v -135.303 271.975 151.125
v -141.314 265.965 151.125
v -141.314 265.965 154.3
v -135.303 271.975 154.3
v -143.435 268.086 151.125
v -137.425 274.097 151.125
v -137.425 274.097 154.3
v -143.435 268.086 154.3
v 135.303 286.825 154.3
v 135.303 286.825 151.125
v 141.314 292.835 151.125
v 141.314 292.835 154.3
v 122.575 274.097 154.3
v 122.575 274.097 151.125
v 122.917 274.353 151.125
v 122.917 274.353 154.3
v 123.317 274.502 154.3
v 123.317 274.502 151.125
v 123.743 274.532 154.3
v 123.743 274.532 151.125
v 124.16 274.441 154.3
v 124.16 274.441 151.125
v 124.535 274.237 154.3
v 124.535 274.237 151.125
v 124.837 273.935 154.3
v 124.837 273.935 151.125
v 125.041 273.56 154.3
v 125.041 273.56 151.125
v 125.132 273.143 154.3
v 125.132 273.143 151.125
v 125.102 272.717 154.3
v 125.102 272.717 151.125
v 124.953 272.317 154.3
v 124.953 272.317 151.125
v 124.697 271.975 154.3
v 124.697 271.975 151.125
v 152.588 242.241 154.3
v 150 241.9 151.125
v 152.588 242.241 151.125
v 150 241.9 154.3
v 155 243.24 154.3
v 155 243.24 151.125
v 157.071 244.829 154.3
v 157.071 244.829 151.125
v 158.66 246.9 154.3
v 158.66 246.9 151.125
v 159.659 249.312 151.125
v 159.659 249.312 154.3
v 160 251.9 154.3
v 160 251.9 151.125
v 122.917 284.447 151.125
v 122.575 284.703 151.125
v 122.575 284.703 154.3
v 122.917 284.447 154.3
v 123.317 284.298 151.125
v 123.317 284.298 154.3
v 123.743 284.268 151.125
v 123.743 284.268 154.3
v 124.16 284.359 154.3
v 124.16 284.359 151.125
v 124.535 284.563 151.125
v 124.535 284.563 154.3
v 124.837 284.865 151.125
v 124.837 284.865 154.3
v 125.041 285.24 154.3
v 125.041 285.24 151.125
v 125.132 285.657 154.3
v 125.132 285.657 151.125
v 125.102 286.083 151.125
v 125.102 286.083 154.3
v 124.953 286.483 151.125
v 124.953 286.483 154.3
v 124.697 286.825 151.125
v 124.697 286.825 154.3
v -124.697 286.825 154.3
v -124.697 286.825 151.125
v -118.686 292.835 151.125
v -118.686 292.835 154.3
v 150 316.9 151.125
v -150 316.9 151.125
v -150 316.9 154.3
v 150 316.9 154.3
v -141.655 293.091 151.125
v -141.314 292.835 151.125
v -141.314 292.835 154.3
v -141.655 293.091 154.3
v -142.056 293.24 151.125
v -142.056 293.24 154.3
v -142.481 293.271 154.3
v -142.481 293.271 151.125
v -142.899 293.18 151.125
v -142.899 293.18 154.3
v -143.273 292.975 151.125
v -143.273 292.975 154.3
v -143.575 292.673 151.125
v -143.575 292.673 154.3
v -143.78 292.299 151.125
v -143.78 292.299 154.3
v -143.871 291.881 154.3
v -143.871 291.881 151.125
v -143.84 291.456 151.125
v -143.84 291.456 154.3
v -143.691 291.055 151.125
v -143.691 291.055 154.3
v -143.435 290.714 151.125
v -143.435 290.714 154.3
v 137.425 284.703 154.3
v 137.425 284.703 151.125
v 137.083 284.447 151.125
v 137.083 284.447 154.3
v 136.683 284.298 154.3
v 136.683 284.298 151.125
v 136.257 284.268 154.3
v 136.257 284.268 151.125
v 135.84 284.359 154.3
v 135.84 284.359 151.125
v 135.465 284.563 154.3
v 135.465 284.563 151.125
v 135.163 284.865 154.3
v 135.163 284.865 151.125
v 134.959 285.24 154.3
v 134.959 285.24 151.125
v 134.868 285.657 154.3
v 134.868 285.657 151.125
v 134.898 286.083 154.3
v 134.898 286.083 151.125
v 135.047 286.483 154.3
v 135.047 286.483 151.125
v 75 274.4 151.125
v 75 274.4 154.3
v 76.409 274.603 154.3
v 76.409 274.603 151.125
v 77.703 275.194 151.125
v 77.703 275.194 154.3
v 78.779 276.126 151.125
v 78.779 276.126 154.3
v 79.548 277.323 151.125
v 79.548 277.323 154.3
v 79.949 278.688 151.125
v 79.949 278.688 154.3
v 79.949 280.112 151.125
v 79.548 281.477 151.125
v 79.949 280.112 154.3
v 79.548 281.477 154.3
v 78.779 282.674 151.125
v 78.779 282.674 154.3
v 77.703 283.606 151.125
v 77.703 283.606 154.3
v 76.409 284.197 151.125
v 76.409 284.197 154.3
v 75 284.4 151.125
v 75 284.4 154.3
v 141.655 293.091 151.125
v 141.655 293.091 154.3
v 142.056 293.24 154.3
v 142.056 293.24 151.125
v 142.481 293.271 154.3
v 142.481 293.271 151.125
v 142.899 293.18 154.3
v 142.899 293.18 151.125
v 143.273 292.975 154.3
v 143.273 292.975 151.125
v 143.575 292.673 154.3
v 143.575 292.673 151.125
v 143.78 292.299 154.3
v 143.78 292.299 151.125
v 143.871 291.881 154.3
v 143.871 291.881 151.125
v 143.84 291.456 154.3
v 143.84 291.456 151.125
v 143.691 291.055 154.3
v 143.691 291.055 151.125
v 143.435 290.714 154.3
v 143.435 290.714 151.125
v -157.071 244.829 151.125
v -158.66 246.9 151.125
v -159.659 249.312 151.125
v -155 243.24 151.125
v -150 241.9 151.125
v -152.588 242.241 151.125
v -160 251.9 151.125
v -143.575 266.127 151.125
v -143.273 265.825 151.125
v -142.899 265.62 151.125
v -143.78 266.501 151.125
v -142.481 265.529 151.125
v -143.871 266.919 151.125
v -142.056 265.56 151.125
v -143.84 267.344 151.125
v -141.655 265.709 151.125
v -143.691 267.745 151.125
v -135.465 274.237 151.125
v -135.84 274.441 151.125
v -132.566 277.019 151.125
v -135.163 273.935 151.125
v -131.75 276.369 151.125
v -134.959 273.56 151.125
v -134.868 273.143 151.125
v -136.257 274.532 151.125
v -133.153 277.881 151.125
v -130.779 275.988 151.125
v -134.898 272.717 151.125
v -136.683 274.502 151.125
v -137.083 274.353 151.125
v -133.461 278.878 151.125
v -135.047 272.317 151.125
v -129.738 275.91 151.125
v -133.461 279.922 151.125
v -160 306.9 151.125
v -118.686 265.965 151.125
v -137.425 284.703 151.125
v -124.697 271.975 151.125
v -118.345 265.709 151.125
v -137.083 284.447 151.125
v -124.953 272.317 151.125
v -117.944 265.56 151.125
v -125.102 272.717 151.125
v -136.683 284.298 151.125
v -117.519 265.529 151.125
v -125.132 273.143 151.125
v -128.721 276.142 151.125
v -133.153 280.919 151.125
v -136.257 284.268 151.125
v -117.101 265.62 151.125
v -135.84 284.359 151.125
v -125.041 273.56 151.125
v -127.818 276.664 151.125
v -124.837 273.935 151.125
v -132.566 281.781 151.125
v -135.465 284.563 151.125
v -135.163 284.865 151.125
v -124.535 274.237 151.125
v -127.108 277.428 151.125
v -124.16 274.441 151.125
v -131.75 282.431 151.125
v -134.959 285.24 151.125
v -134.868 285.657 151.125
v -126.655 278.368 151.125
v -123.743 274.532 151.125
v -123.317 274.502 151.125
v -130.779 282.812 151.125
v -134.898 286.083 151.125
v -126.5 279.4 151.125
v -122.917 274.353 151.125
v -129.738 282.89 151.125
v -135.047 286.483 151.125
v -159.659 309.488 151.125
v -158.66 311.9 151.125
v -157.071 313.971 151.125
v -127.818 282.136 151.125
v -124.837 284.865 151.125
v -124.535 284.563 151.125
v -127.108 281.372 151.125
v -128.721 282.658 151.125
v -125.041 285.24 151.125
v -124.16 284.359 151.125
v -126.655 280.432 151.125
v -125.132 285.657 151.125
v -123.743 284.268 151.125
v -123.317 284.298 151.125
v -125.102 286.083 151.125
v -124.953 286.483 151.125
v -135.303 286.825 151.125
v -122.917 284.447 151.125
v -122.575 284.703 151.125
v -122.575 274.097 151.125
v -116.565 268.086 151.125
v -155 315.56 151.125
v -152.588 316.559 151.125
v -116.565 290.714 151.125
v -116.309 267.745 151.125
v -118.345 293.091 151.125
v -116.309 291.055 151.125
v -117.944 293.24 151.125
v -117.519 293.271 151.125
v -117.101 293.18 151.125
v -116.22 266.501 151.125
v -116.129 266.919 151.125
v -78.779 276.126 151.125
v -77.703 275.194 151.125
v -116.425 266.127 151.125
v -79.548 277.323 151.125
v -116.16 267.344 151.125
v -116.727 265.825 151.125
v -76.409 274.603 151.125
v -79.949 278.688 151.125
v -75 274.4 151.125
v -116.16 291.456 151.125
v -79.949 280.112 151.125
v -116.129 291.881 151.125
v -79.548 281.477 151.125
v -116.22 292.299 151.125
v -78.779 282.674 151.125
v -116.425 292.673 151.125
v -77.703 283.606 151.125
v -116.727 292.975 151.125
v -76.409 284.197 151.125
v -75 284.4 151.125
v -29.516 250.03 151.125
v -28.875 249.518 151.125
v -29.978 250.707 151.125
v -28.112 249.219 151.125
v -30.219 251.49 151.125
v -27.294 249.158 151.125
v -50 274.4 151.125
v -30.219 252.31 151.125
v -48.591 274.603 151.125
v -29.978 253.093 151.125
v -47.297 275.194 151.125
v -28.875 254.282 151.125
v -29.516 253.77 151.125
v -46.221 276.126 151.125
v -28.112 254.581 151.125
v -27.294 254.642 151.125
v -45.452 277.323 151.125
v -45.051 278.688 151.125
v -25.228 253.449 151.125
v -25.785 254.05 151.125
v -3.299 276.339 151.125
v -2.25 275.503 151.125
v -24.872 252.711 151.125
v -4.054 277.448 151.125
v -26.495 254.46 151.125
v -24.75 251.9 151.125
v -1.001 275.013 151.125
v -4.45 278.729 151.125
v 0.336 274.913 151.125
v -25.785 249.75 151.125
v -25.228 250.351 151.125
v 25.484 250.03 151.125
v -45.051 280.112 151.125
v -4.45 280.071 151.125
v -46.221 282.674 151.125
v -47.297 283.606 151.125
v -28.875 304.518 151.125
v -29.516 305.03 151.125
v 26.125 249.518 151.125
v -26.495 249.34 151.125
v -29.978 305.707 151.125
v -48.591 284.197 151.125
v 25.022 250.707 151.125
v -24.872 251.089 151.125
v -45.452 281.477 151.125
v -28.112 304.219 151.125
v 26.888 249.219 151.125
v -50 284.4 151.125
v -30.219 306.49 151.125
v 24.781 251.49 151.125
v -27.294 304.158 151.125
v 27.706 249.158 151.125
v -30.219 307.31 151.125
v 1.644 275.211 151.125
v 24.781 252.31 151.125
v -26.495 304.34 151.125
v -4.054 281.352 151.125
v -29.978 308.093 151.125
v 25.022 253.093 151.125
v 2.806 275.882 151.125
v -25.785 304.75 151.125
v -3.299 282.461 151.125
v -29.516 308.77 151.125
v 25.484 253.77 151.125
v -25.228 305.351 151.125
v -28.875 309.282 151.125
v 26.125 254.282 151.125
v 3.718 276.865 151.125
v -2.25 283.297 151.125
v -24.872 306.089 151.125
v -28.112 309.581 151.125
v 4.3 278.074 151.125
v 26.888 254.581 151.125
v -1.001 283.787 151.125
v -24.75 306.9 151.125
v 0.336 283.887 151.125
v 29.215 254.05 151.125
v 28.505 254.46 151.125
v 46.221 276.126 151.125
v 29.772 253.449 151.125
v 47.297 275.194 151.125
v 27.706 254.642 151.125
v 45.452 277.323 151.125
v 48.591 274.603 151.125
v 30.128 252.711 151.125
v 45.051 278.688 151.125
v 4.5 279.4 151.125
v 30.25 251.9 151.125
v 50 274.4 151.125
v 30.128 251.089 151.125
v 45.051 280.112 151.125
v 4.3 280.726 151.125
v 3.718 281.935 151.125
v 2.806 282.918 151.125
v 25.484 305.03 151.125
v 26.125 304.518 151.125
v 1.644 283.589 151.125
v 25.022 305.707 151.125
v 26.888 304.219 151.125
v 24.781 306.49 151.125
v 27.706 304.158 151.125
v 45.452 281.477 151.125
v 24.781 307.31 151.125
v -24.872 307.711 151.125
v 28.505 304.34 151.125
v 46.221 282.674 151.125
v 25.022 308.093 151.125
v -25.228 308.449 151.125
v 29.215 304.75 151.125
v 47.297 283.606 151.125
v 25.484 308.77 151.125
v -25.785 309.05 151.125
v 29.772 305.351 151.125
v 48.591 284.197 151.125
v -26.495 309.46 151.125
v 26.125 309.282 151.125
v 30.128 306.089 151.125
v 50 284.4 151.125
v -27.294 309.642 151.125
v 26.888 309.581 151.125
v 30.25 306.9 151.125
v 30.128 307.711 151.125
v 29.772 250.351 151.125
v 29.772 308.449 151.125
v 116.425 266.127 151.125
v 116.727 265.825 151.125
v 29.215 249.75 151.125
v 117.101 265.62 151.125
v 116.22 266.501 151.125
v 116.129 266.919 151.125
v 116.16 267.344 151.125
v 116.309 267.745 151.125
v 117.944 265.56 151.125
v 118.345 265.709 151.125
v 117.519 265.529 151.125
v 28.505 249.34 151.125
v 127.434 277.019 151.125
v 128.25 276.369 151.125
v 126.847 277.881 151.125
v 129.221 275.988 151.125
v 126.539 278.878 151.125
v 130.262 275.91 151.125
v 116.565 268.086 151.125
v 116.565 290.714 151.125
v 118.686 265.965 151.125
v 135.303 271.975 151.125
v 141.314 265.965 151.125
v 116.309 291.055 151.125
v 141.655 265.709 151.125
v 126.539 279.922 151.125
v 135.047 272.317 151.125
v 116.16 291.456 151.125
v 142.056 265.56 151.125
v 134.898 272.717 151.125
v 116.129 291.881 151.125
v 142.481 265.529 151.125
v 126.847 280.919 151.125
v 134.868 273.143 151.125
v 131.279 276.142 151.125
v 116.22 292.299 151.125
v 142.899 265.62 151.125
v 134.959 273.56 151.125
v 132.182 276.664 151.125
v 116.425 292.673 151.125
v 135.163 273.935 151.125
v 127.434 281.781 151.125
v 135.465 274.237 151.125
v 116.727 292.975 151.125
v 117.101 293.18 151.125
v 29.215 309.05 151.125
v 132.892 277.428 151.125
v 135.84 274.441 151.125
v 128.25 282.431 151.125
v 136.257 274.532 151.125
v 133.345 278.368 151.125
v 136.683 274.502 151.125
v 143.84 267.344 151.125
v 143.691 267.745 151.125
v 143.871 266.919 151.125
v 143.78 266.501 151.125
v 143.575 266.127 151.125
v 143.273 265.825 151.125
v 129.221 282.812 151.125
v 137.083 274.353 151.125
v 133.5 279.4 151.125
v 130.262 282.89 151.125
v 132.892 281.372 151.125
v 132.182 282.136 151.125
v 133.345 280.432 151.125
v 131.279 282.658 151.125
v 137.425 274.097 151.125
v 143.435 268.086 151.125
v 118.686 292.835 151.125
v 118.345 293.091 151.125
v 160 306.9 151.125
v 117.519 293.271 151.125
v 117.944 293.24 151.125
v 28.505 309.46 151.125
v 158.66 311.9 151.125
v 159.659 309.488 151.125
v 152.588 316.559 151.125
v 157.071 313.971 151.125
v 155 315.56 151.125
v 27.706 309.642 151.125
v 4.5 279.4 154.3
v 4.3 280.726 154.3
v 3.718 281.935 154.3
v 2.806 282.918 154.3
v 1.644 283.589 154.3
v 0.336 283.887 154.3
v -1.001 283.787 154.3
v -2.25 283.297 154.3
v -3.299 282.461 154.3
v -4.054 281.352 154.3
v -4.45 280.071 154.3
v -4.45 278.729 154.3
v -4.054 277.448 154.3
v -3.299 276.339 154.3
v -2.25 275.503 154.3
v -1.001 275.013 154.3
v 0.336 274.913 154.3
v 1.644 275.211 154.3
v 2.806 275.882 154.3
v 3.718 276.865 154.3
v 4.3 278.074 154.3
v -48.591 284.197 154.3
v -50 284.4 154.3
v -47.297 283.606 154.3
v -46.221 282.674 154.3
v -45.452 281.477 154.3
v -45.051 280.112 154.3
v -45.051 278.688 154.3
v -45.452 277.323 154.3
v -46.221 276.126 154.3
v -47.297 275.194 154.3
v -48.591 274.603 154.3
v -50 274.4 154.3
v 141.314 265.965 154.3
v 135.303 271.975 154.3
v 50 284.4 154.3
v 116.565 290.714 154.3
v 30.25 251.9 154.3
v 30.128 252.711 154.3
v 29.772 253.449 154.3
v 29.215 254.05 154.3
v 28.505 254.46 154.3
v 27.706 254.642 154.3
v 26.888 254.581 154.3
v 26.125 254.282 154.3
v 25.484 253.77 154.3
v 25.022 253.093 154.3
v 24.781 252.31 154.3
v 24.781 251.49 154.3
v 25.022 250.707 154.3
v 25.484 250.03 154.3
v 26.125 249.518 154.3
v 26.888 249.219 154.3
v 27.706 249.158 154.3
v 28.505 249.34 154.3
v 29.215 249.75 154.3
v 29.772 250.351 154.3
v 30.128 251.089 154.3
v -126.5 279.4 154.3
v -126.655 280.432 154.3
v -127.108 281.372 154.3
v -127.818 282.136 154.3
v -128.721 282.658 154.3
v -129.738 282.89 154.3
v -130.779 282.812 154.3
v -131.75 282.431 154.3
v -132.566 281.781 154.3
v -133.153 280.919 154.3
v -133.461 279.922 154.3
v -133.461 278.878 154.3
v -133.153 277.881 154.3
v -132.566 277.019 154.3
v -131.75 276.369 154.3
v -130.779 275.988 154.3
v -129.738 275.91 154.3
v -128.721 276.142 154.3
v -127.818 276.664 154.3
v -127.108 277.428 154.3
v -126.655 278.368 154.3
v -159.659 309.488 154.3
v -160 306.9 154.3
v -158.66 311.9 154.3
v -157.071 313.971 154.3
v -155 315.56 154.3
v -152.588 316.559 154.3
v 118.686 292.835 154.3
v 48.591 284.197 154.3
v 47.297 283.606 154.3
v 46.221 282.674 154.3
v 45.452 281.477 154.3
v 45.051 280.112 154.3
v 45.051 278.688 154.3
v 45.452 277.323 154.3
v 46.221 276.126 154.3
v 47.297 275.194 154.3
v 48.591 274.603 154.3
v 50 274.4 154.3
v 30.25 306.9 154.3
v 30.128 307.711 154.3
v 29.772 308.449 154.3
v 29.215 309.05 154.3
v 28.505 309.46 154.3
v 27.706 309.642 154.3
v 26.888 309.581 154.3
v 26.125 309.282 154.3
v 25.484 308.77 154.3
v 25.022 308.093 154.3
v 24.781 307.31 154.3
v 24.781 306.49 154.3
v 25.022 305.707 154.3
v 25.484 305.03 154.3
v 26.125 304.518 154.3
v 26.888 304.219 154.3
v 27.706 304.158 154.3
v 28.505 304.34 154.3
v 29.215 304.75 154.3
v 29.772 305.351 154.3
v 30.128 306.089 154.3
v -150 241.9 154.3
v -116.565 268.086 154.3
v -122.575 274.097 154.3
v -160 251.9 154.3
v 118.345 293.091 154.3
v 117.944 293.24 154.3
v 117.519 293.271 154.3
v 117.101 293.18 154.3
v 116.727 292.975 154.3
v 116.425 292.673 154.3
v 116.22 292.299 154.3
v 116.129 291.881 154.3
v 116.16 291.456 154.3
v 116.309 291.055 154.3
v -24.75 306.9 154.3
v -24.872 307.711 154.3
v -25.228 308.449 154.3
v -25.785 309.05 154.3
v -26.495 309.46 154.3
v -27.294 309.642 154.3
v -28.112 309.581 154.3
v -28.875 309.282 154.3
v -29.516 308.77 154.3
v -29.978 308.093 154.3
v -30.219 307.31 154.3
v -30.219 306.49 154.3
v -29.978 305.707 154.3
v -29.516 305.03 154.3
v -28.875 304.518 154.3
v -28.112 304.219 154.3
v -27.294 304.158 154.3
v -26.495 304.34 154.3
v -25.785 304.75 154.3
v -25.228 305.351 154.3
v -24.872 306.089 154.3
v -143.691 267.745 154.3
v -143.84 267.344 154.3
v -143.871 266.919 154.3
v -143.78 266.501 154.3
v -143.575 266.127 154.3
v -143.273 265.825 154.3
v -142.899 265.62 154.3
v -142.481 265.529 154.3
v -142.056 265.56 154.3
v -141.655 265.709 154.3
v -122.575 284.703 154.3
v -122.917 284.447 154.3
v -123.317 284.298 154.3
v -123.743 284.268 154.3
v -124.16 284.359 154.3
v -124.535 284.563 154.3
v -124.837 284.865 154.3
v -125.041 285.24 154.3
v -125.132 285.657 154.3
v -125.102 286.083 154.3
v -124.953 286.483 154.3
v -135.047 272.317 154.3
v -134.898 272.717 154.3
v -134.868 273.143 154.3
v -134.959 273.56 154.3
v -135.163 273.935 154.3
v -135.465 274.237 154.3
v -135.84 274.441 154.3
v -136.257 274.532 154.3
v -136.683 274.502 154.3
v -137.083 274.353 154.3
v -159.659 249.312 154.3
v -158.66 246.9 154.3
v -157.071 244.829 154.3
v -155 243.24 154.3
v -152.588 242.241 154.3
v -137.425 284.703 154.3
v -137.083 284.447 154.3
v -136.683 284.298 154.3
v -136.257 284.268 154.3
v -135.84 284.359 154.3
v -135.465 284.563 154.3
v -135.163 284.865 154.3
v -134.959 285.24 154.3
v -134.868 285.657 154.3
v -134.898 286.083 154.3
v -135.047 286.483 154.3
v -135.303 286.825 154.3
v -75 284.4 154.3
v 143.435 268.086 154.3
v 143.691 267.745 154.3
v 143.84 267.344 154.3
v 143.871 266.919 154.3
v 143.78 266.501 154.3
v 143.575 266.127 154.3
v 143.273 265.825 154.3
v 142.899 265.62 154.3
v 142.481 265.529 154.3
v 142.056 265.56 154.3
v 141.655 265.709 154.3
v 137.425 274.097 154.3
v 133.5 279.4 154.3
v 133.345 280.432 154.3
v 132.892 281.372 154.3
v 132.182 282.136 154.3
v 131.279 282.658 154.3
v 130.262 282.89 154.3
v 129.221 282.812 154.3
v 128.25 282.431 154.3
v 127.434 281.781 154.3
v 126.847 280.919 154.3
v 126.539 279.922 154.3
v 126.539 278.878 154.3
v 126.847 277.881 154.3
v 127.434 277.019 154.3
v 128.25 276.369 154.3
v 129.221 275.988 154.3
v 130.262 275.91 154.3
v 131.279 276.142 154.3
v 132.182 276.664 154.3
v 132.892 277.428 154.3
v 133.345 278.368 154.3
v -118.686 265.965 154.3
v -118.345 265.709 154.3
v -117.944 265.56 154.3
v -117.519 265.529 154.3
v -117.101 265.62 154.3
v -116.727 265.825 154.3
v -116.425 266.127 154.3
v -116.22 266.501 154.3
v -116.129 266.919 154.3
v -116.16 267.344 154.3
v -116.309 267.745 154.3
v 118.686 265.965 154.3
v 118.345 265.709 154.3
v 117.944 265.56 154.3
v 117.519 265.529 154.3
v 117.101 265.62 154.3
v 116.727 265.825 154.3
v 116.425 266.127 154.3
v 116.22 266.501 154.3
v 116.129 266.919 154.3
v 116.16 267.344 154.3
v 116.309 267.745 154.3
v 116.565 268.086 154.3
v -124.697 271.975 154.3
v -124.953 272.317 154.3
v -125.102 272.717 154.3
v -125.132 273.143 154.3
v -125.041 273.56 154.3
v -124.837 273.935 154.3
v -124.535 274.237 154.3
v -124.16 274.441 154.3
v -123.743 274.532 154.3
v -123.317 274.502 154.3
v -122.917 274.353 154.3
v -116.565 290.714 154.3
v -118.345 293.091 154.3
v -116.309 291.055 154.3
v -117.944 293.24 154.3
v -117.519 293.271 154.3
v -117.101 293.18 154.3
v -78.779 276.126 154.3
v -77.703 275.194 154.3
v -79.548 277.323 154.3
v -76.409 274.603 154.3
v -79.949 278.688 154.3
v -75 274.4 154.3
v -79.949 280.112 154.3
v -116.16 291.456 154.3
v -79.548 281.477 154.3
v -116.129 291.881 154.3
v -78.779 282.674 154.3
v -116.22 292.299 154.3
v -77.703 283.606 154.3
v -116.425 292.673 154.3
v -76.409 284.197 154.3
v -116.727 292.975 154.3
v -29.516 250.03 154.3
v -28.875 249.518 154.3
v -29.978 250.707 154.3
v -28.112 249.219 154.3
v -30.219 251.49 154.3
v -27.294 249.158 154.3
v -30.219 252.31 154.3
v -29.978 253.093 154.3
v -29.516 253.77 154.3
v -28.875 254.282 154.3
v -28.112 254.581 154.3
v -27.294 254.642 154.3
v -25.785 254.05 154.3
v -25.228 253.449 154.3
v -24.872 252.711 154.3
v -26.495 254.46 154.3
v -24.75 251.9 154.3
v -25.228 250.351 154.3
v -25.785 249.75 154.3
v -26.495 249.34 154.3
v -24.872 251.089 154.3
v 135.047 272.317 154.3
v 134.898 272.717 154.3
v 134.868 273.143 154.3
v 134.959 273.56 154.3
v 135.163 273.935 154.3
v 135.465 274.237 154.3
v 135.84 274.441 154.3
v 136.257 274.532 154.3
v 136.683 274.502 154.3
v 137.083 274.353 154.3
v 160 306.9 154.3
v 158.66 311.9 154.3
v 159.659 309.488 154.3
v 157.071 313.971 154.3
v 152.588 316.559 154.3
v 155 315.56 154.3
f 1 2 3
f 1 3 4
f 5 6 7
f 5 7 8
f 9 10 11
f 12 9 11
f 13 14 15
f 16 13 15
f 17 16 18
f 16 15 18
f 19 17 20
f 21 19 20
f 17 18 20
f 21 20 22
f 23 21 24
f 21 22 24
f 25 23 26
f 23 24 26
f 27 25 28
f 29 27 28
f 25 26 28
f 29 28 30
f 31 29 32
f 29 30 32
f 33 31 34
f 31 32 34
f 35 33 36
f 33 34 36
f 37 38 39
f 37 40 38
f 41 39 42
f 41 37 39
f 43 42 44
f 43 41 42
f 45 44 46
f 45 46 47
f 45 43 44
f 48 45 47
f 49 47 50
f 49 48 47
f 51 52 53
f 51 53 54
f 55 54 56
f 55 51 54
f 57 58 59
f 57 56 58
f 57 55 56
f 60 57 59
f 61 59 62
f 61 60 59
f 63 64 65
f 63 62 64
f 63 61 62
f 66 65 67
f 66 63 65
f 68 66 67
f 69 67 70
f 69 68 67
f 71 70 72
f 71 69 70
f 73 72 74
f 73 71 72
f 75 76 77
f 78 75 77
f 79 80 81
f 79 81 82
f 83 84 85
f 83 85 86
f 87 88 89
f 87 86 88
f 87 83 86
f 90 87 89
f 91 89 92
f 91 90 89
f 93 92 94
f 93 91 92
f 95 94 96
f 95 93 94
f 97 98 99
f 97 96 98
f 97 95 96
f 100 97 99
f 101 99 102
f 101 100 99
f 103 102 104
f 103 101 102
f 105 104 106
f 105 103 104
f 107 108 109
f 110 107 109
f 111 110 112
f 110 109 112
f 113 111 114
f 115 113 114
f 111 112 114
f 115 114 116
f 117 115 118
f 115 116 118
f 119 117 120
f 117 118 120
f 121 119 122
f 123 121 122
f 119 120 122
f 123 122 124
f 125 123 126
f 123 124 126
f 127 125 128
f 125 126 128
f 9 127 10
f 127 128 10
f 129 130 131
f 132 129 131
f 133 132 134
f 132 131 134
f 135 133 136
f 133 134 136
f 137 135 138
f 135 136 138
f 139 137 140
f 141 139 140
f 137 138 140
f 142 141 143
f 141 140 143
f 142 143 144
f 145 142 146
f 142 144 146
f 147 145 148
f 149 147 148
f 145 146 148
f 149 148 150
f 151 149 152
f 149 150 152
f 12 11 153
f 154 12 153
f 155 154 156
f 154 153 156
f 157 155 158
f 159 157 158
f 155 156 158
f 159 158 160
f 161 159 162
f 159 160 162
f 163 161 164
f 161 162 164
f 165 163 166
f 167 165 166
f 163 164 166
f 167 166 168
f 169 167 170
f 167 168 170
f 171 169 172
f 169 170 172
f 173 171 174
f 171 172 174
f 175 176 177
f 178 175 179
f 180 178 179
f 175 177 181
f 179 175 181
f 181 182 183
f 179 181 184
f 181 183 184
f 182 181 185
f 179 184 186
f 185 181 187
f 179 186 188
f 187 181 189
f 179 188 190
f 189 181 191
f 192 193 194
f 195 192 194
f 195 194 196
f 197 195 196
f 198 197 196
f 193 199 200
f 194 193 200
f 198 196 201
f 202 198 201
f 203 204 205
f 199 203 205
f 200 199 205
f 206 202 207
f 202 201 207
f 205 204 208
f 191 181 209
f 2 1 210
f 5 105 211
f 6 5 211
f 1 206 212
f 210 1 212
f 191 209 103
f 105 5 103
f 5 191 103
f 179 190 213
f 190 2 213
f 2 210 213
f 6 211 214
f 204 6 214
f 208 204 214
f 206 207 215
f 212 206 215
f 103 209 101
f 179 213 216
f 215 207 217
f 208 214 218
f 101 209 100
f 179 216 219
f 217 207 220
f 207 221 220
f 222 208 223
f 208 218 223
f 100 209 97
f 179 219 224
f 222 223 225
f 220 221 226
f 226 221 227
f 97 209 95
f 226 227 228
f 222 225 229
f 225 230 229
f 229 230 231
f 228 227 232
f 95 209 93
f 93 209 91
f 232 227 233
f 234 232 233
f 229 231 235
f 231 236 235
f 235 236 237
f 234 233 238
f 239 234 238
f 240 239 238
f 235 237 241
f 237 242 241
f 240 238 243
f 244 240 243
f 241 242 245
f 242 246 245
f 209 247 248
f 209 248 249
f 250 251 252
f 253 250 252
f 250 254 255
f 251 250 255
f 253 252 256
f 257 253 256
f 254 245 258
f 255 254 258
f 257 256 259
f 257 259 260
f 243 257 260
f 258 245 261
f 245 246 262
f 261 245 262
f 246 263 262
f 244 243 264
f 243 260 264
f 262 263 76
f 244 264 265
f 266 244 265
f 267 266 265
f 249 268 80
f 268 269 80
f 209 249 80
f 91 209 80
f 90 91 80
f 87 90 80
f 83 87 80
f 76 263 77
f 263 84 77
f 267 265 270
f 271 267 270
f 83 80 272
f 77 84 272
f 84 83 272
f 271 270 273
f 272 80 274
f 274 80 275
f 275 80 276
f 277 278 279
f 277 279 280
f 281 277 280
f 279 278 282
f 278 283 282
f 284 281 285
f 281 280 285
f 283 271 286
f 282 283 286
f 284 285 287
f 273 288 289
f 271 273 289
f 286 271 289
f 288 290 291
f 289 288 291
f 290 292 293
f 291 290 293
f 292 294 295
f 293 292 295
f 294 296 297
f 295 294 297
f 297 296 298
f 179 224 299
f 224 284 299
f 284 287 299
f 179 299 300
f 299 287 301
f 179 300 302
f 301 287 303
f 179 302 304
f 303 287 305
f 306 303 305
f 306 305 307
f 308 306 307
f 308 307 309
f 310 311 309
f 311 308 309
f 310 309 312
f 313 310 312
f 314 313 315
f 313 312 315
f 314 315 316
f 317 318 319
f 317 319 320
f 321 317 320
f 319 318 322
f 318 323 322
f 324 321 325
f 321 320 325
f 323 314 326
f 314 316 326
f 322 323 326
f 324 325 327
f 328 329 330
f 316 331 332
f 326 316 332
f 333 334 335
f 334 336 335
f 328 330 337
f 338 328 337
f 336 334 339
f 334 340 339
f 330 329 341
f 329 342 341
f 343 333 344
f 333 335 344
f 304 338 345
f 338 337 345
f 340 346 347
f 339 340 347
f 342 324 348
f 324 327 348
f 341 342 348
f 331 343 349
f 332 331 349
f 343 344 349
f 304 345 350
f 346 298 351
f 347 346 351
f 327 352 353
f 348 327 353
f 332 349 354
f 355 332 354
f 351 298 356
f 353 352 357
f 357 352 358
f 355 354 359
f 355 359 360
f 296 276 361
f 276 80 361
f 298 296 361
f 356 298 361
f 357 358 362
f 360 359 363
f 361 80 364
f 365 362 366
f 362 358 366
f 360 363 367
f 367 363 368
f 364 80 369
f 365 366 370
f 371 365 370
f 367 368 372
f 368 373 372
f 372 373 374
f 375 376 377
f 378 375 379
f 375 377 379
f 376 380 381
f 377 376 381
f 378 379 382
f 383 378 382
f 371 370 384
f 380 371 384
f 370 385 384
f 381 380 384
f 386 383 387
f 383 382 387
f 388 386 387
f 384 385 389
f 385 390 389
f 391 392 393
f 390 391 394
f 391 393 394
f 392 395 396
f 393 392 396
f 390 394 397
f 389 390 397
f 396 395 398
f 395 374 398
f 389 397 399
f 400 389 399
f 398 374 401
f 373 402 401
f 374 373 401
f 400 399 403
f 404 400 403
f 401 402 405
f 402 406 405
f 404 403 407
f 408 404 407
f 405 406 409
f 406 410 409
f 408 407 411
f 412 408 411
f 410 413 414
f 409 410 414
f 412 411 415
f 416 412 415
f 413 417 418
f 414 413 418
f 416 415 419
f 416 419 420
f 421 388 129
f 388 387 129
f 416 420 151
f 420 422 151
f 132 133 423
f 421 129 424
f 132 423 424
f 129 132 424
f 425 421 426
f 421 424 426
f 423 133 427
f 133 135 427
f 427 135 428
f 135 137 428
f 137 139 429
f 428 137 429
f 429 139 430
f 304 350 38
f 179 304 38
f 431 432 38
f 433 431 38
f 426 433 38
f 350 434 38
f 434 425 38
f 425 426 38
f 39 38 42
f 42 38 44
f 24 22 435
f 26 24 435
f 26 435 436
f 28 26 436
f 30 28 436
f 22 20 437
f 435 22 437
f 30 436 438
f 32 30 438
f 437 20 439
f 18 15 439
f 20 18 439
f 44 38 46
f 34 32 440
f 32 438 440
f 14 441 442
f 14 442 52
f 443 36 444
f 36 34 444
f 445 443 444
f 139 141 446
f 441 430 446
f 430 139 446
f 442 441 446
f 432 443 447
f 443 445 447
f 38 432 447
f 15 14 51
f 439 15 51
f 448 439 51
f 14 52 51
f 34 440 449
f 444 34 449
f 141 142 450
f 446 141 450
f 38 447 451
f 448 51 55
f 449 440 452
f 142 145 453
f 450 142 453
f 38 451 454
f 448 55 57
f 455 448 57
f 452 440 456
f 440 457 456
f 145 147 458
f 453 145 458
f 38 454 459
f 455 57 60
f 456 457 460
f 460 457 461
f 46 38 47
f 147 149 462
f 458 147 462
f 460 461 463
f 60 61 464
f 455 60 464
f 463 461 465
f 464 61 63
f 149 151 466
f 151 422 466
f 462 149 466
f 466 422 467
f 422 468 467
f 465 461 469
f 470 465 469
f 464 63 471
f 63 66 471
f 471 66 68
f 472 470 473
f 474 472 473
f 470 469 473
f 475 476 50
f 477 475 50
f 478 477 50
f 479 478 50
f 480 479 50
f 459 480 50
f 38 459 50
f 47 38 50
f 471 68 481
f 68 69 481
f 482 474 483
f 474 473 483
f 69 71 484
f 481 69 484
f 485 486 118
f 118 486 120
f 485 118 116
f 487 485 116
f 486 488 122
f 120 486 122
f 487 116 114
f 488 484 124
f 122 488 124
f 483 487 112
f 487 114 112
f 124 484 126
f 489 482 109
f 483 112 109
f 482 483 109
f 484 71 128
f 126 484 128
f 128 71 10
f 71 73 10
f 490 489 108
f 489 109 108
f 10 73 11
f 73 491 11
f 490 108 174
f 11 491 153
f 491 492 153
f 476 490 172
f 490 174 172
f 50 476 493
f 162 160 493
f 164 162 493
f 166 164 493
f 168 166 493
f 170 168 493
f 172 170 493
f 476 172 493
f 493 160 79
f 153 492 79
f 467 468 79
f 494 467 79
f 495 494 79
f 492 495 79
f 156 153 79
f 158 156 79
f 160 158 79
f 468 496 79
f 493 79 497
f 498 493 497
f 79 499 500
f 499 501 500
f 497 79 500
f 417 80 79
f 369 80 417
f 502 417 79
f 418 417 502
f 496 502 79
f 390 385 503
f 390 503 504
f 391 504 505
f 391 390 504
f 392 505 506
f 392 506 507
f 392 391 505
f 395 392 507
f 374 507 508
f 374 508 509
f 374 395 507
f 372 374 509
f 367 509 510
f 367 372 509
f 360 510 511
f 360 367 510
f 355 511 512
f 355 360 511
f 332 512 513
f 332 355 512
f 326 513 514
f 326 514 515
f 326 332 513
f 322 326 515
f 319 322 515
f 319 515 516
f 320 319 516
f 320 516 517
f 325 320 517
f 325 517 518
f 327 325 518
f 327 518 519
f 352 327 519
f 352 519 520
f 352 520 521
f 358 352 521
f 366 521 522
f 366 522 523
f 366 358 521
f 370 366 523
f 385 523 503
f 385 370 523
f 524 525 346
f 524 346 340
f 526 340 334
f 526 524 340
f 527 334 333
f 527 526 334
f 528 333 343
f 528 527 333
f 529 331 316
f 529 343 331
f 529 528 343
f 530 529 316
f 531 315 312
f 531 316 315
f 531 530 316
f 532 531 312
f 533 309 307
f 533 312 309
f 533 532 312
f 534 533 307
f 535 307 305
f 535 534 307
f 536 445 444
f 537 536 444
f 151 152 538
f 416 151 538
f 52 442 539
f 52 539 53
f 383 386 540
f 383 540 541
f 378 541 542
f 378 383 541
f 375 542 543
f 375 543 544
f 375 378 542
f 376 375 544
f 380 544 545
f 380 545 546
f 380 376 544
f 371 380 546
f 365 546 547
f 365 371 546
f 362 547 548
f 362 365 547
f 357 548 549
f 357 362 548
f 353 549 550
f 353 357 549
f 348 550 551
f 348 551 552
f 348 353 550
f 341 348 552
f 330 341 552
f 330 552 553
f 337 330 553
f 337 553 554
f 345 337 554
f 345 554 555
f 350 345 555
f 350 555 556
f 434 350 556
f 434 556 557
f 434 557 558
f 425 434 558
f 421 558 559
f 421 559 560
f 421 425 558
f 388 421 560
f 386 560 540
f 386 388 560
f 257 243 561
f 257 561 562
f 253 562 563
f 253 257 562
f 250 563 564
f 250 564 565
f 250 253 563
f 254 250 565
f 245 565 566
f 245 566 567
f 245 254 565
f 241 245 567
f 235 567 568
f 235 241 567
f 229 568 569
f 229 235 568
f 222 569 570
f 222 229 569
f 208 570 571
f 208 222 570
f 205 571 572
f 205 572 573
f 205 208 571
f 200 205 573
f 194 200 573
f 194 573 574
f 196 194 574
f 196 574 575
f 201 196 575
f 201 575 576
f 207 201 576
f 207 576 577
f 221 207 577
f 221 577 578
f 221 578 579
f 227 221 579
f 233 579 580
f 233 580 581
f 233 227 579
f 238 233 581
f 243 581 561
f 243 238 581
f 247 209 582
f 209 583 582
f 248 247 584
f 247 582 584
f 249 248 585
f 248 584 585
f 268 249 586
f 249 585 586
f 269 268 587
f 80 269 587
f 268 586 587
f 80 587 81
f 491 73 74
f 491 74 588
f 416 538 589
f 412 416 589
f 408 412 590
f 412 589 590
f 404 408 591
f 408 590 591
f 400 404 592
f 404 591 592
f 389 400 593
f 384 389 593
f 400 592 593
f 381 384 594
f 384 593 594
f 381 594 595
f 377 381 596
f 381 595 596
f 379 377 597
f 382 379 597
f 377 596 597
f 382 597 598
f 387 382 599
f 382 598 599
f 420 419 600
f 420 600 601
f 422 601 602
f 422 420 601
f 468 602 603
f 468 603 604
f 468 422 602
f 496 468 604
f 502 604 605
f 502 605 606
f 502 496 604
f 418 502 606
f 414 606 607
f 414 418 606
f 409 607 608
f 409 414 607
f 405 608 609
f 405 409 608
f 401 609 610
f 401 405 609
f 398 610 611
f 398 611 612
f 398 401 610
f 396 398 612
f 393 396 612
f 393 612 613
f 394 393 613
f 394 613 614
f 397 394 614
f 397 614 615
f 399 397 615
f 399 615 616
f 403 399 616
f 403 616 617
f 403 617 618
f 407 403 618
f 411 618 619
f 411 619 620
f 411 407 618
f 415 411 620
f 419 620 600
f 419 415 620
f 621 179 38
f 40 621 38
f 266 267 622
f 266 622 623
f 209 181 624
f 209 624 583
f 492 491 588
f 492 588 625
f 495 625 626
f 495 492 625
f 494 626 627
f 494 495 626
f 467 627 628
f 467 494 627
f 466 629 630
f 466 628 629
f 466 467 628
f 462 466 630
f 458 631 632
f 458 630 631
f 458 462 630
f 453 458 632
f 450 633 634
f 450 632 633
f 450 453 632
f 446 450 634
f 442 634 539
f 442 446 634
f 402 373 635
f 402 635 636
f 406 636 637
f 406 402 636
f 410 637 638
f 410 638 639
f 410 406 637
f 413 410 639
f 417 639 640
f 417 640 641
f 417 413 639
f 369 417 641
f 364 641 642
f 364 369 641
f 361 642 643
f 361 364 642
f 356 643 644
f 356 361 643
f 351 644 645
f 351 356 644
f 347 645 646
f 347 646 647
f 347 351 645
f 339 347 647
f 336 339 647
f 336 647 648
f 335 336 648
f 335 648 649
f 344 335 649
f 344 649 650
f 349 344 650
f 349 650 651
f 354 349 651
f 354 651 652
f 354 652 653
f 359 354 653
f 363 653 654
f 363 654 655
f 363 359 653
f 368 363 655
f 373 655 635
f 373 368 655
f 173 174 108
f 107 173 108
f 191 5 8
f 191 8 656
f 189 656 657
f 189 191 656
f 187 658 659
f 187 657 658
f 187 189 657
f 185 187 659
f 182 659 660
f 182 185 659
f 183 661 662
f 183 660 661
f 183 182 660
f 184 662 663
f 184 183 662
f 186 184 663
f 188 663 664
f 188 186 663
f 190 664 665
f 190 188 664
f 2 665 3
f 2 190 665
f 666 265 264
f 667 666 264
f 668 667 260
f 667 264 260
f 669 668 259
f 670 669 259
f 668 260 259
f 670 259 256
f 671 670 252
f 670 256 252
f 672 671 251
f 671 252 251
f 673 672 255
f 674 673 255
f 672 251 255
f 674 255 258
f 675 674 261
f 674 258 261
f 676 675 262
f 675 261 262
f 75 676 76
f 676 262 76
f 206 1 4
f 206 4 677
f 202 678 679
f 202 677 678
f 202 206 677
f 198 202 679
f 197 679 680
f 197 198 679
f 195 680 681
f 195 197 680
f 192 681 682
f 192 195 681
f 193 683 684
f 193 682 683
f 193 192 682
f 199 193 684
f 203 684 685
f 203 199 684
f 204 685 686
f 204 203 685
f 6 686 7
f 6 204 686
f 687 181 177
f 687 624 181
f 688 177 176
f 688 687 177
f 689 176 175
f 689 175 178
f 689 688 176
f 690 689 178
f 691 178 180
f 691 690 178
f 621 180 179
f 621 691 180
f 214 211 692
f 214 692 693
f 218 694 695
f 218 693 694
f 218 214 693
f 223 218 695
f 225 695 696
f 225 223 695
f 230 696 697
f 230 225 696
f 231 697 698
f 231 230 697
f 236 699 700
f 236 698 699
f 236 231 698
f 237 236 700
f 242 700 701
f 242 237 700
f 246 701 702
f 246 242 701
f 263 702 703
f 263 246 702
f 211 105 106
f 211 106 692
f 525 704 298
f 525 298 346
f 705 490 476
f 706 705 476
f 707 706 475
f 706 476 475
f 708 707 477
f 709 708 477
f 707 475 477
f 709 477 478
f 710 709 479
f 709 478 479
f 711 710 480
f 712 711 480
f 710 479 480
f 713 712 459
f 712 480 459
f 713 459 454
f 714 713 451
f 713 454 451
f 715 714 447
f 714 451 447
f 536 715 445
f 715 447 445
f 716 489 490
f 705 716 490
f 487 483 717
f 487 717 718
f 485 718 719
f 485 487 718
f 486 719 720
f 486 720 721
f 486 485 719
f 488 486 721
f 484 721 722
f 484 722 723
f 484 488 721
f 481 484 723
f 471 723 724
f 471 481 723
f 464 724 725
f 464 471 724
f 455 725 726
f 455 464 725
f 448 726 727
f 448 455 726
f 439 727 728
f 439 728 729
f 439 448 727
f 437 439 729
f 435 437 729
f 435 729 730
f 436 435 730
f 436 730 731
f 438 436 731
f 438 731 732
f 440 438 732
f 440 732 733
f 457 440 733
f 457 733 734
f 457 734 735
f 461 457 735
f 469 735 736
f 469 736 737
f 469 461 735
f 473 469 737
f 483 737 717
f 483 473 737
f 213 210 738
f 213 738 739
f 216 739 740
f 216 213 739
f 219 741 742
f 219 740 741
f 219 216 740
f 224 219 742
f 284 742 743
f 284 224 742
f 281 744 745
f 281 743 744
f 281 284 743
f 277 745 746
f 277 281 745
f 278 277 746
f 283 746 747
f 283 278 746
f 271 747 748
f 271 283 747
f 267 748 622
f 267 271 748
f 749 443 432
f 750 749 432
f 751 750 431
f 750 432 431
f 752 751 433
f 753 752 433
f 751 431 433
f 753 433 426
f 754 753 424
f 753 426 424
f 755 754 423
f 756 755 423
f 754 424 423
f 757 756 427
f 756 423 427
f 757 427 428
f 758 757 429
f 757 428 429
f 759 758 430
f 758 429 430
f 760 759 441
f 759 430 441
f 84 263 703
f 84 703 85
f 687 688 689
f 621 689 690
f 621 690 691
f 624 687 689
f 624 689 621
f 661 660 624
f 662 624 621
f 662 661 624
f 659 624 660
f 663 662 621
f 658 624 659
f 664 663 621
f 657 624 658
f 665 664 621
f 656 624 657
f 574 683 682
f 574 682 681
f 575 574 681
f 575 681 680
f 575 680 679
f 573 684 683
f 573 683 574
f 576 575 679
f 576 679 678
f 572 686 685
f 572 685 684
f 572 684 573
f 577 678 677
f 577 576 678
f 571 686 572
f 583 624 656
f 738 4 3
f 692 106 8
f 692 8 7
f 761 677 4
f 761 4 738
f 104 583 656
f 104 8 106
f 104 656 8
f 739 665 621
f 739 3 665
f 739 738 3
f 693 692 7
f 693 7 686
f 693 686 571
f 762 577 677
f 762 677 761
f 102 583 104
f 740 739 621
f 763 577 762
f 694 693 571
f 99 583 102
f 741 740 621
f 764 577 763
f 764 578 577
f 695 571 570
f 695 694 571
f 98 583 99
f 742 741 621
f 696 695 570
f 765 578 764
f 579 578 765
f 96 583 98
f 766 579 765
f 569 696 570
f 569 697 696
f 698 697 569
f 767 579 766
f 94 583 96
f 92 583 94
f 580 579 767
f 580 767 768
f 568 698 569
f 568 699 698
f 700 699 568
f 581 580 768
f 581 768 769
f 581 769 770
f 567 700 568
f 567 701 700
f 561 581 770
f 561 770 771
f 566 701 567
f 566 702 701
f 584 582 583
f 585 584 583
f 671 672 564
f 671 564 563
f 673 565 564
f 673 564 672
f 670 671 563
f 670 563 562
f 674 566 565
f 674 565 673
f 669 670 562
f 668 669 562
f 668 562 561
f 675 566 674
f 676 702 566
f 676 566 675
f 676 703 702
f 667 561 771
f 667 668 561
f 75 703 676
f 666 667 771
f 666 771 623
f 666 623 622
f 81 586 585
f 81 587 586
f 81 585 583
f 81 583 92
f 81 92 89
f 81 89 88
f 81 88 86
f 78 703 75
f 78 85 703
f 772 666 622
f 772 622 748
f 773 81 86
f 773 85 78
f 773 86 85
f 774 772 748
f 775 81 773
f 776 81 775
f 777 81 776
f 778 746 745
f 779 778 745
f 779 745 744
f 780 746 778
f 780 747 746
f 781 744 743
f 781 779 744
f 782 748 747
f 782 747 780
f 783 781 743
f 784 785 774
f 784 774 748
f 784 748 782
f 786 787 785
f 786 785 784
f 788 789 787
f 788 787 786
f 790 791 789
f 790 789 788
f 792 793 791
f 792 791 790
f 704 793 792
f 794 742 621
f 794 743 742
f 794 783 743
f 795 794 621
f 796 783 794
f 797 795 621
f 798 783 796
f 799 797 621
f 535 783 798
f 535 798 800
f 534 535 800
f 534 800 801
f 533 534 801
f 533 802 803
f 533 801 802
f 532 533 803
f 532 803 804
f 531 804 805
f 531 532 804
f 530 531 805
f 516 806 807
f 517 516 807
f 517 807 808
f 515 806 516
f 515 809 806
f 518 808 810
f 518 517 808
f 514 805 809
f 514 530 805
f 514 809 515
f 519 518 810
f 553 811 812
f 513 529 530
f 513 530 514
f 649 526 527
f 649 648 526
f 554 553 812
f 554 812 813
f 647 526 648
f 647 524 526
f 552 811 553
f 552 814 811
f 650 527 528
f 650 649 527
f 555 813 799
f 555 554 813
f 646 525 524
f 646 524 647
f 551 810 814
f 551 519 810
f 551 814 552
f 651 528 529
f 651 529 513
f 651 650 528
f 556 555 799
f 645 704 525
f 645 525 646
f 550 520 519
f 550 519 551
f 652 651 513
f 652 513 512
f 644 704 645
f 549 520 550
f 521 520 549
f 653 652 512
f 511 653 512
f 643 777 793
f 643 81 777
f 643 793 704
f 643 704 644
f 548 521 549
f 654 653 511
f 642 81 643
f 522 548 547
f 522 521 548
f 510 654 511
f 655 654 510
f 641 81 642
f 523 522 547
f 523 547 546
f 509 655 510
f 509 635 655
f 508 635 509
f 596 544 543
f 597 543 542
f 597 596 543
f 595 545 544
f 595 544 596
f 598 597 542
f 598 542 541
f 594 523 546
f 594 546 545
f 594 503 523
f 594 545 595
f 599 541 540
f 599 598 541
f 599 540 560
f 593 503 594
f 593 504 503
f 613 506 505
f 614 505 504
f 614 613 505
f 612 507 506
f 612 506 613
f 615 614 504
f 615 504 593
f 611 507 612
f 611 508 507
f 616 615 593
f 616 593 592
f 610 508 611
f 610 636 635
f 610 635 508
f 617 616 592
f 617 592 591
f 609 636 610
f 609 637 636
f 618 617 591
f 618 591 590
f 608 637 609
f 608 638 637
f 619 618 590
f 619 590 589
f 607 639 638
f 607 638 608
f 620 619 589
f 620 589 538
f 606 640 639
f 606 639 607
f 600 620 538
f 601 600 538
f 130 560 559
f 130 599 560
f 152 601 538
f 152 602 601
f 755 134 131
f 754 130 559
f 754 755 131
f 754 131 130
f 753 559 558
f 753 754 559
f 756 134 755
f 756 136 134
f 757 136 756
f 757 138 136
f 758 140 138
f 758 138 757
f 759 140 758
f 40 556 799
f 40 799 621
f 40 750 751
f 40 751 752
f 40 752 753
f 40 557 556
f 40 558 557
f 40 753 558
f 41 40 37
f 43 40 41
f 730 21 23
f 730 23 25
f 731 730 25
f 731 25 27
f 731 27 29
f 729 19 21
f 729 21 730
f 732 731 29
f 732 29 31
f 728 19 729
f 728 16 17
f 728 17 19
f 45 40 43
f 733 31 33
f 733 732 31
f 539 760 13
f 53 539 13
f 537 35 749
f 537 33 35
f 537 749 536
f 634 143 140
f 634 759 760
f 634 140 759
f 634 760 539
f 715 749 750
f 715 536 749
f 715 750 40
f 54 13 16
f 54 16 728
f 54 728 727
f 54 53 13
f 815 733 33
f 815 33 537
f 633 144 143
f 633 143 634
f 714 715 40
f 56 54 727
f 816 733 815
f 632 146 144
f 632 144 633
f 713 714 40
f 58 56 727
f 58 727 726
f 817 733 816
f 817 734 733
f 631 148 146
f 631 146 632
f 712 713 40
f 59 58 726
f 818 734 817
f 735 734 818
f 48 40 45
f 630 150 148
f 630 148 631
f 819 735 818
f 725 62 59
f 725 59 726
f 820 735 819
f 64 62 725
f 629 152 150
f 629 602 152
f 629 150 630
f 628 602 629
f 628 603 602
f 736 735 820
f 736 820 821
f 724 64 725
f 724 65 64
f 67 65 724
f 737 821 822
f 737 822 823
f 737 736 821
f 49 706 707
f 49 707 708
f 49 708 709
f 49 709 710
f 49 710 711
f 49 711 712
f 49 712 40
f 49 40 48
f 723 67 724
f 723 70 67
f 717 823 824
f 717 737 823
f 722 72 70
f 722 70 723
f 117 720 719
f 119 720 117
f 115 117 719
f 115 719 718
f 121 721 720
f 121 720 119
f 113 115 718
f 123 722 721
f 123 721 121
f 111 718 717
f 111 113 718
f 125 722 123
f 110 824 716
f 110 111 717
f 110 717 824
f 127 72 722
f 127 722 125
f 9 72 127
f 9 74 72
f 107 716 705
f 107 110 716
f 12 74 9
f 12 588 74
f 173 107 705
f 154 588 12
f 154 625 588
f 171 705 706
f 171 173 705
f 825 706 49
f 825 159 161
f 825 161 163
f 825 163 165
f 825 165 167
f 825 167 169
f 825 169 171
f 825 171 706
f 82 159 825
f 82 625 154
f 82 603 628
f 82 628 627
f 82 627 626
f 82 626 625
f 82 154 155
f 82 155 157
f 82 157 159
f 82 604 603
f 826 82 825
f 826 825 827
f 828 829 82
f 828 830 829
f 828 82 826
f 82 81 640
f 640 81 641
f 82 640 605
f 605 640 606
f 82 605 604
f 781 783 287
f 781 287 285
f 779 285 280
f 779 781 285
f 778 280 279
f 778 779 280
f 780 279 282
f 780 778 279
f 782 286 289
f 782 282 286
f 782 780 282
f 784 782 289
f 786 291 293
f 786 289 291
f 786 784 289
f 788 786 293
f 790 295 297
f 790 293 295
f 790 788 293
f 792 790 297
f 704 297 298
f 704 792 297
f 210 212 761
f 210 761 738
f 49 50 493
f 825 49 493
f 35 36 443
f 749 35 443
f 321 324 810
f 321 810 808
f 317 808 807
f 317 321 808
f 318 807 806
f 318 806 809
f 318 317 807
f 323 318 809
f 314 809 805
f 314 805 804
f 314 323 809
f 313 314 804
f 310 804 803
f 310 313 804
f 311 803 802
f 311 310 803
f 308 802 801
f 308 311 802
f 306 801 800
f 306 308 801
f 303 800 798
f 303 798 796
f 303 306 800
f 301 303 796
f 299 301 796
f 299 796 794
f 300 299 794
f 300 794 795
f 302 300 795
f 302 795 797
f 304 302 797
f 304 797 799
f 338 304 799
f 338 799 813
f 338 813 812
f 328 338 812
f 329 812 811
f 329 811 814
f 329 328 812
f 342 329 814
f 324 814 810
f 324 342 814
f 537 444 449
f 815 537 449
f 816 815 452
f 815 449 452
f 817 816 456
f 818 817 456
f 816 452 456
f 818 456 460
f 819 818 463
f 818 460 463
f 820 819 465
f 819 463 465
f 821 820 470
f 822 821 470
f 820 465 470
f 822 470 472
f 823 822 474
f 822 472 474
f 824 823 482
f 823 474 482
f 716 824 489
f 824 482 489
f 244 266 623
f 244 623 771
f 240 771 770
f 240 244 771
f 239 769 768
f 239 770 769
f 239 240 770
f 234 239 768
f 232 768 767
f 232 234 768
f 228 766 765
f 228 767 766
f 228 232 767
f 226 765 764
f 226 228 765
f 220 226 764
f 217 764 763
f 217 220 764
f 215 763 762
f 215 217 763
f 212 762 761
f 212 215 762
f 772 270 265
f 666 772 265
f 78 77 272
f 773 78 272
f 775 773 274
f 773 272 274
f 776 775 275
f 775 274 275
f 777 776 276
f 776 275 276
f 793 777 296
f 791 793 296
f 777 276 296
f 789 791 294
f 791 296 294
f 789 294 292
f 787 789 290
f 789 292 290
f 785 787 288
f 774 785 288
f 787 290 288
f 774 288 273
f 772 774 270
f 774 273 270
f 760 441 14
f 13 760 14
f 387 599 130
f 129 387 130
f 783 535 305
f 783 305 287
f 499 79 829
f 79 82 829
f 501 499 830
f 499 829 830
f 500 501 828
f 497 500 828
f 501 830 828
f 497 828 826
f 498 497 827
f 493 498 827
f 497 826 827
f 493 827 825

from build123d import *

# Parameters (mm, degrees)
SKETCH1_W                       = 320
SKETCH1_H                       = 75
SKETCH1_R                       = 4.5
SKETCH1_R_2                     = 2.75
SKETCH1_R_3                     = 3.5
BOSS_EXTRUDE1_DEPTH             = 3.175
MOUNTING_AND_ACCESS_HOLES_DEPTH = 356.015056899
FILLET1_R                       = 10


with BuildPart() as part:
    # Sketch1 → Boss-Extrude1 (new body)
    with BuildSketch(Plane.XY.offset(151.125)):
        with Locations((0, 279.4)):
            Rectangle(SKETCH1_W, SKETCH1_H)
        with Locations((0, 279.4)):
            Circle(SKETCH1_R, mode=Mode.SUBTRACT)
        with Locations((27.5, 251.9)):
            Circle(SKETCH1_R_2, mode=Mode.SUBTRACT)
        with Locations((-27.5, 251.9)):
            Circle(SKETCH1_R_2, mode=Mode.SUBTRACT)
        with Locations((-27.5, 306.9)):
            Circle(SKETCH1_R_2, mode=Mode.SUBTRACT)
        with Locations((27.5, 306.9)):
            Circle(SKETCH1_R_2, mode=Mode.SUBTRACT)
        with Locations((130, 279.4)):
            Circle(SKETCH1_R_3, mode=Mode.SUBTRACT)
        with Locations((-130, 279.4)):
            Circle(SKETCH1_R_3, mode=Mode.SUBTRACT)
    extrude(amount=BOSS_EXTRUDE1_DEPTH)

    # Sketch2 → Mounting and Access Holes (cut, symmetric)
    with BuildSketch(Plane.XY.offset(154.3)):
        with BuildLine():
            Line((-124.696699141, 286.824621202), (-118.686291501, 292.835028843))
            ThreePointArc((-118.686291501, 292.835028843), (-116.564971157, 292.835028843), (-116.564971157, 290.713708499))
            Line((-116.564971157, 290.713708499), (-122.575378798, 284.703300859))
            ThreePointArc((-122.575378798, 284.703300859), (-124.696699141, 284.703300859), (-124.696699141, 286.824621202))
        make_face()
        with BuildLine():
            Line((-135.303300859, 286.824621202), (-141.313708499, 292.835028843))
            ThreePointArc((-141.313708499, 292.835028843), (-143.435028843, 292.835028843), (-143.435028843, 290.713708499))
            Line((-143.435028843, 290.713708499), (-137.424621202, 284.703300859))
            ThreePointArc((-137.424621202, 284.703300859), (-135.303300859, 284.703300859), (-135.303300859, 286.824621202))
        make_face()
        with BuildLine():
            Line((-137.424621202, 274.096699141), (-143.435028843, 268.086291501))
            ThreePointArc((-143.435028843, 268.086291501), (-143.435028843, 265.964971157), (-141.313708499, 265.964971157))
            Line((-141.313708499, 265.964971157), (-135.303300859, 271.975378798))
            ThreePointArc((-135.303300859, 271.975378798), (-135.303300859, 274.096699141), (-137.424621202, 274.096699141))
        make_face()
        with BuildLine():
            Line((-124.696699141, 271.975378798), (-118.686291501, 265.964971157))
            ThreePointArc((-118.686291501, 265.964971157), (-116.564971157, 265.964971157), (-116.564971157, 268.086291501))
            Line((-116.564971157, 268.086291501), (-122.575378798, 274.096699141))
            ThreePointArc((-122.575378798, 274.096699141), (-124.696699141, 274.096699141), (-124.696699141, 271.975378798))
        make_face()
        with BuildLine():
            Line((-50, 274.4), (-75, 274.4))
            ThreePointArc((-75, 274.4), (-80, 279.4), (-75, 284.4))
            Line((-75, 284.4), (-50, 284.4))
            ThreePointArc((-50, 284.4), (-45, 279.4), (-50, 274.4))
        make_face()
    mounting_and_access_holes = extrude(amount=MOUNTING_AND_ACCESS_HOLES_DEPTH, both=True, mode=Mode.SUBTRACT)

    # Mirror1: Mounting and Access Holes across plane
    add(mounting_and_access_holes.mirror(Plane(origin=(0, 0, 0), x_dir=(0, 0, 1), z_dir=(1, 0, 0))), mode=Mode.SUBTRACT)

    # Fillet1
    fillet1_edges = [part.edges().sort_by_distance(p)[0] for p in [
        (160, 241.9, 152.7125),
        (-160, 241.9, 152.7125),
        (-160, 316.9, 152.7125),
        (160, 316.9, 152.7125),
    ]]
    fillet(fillet1_edges, radius=FILLET1_R)


solid = part.part
